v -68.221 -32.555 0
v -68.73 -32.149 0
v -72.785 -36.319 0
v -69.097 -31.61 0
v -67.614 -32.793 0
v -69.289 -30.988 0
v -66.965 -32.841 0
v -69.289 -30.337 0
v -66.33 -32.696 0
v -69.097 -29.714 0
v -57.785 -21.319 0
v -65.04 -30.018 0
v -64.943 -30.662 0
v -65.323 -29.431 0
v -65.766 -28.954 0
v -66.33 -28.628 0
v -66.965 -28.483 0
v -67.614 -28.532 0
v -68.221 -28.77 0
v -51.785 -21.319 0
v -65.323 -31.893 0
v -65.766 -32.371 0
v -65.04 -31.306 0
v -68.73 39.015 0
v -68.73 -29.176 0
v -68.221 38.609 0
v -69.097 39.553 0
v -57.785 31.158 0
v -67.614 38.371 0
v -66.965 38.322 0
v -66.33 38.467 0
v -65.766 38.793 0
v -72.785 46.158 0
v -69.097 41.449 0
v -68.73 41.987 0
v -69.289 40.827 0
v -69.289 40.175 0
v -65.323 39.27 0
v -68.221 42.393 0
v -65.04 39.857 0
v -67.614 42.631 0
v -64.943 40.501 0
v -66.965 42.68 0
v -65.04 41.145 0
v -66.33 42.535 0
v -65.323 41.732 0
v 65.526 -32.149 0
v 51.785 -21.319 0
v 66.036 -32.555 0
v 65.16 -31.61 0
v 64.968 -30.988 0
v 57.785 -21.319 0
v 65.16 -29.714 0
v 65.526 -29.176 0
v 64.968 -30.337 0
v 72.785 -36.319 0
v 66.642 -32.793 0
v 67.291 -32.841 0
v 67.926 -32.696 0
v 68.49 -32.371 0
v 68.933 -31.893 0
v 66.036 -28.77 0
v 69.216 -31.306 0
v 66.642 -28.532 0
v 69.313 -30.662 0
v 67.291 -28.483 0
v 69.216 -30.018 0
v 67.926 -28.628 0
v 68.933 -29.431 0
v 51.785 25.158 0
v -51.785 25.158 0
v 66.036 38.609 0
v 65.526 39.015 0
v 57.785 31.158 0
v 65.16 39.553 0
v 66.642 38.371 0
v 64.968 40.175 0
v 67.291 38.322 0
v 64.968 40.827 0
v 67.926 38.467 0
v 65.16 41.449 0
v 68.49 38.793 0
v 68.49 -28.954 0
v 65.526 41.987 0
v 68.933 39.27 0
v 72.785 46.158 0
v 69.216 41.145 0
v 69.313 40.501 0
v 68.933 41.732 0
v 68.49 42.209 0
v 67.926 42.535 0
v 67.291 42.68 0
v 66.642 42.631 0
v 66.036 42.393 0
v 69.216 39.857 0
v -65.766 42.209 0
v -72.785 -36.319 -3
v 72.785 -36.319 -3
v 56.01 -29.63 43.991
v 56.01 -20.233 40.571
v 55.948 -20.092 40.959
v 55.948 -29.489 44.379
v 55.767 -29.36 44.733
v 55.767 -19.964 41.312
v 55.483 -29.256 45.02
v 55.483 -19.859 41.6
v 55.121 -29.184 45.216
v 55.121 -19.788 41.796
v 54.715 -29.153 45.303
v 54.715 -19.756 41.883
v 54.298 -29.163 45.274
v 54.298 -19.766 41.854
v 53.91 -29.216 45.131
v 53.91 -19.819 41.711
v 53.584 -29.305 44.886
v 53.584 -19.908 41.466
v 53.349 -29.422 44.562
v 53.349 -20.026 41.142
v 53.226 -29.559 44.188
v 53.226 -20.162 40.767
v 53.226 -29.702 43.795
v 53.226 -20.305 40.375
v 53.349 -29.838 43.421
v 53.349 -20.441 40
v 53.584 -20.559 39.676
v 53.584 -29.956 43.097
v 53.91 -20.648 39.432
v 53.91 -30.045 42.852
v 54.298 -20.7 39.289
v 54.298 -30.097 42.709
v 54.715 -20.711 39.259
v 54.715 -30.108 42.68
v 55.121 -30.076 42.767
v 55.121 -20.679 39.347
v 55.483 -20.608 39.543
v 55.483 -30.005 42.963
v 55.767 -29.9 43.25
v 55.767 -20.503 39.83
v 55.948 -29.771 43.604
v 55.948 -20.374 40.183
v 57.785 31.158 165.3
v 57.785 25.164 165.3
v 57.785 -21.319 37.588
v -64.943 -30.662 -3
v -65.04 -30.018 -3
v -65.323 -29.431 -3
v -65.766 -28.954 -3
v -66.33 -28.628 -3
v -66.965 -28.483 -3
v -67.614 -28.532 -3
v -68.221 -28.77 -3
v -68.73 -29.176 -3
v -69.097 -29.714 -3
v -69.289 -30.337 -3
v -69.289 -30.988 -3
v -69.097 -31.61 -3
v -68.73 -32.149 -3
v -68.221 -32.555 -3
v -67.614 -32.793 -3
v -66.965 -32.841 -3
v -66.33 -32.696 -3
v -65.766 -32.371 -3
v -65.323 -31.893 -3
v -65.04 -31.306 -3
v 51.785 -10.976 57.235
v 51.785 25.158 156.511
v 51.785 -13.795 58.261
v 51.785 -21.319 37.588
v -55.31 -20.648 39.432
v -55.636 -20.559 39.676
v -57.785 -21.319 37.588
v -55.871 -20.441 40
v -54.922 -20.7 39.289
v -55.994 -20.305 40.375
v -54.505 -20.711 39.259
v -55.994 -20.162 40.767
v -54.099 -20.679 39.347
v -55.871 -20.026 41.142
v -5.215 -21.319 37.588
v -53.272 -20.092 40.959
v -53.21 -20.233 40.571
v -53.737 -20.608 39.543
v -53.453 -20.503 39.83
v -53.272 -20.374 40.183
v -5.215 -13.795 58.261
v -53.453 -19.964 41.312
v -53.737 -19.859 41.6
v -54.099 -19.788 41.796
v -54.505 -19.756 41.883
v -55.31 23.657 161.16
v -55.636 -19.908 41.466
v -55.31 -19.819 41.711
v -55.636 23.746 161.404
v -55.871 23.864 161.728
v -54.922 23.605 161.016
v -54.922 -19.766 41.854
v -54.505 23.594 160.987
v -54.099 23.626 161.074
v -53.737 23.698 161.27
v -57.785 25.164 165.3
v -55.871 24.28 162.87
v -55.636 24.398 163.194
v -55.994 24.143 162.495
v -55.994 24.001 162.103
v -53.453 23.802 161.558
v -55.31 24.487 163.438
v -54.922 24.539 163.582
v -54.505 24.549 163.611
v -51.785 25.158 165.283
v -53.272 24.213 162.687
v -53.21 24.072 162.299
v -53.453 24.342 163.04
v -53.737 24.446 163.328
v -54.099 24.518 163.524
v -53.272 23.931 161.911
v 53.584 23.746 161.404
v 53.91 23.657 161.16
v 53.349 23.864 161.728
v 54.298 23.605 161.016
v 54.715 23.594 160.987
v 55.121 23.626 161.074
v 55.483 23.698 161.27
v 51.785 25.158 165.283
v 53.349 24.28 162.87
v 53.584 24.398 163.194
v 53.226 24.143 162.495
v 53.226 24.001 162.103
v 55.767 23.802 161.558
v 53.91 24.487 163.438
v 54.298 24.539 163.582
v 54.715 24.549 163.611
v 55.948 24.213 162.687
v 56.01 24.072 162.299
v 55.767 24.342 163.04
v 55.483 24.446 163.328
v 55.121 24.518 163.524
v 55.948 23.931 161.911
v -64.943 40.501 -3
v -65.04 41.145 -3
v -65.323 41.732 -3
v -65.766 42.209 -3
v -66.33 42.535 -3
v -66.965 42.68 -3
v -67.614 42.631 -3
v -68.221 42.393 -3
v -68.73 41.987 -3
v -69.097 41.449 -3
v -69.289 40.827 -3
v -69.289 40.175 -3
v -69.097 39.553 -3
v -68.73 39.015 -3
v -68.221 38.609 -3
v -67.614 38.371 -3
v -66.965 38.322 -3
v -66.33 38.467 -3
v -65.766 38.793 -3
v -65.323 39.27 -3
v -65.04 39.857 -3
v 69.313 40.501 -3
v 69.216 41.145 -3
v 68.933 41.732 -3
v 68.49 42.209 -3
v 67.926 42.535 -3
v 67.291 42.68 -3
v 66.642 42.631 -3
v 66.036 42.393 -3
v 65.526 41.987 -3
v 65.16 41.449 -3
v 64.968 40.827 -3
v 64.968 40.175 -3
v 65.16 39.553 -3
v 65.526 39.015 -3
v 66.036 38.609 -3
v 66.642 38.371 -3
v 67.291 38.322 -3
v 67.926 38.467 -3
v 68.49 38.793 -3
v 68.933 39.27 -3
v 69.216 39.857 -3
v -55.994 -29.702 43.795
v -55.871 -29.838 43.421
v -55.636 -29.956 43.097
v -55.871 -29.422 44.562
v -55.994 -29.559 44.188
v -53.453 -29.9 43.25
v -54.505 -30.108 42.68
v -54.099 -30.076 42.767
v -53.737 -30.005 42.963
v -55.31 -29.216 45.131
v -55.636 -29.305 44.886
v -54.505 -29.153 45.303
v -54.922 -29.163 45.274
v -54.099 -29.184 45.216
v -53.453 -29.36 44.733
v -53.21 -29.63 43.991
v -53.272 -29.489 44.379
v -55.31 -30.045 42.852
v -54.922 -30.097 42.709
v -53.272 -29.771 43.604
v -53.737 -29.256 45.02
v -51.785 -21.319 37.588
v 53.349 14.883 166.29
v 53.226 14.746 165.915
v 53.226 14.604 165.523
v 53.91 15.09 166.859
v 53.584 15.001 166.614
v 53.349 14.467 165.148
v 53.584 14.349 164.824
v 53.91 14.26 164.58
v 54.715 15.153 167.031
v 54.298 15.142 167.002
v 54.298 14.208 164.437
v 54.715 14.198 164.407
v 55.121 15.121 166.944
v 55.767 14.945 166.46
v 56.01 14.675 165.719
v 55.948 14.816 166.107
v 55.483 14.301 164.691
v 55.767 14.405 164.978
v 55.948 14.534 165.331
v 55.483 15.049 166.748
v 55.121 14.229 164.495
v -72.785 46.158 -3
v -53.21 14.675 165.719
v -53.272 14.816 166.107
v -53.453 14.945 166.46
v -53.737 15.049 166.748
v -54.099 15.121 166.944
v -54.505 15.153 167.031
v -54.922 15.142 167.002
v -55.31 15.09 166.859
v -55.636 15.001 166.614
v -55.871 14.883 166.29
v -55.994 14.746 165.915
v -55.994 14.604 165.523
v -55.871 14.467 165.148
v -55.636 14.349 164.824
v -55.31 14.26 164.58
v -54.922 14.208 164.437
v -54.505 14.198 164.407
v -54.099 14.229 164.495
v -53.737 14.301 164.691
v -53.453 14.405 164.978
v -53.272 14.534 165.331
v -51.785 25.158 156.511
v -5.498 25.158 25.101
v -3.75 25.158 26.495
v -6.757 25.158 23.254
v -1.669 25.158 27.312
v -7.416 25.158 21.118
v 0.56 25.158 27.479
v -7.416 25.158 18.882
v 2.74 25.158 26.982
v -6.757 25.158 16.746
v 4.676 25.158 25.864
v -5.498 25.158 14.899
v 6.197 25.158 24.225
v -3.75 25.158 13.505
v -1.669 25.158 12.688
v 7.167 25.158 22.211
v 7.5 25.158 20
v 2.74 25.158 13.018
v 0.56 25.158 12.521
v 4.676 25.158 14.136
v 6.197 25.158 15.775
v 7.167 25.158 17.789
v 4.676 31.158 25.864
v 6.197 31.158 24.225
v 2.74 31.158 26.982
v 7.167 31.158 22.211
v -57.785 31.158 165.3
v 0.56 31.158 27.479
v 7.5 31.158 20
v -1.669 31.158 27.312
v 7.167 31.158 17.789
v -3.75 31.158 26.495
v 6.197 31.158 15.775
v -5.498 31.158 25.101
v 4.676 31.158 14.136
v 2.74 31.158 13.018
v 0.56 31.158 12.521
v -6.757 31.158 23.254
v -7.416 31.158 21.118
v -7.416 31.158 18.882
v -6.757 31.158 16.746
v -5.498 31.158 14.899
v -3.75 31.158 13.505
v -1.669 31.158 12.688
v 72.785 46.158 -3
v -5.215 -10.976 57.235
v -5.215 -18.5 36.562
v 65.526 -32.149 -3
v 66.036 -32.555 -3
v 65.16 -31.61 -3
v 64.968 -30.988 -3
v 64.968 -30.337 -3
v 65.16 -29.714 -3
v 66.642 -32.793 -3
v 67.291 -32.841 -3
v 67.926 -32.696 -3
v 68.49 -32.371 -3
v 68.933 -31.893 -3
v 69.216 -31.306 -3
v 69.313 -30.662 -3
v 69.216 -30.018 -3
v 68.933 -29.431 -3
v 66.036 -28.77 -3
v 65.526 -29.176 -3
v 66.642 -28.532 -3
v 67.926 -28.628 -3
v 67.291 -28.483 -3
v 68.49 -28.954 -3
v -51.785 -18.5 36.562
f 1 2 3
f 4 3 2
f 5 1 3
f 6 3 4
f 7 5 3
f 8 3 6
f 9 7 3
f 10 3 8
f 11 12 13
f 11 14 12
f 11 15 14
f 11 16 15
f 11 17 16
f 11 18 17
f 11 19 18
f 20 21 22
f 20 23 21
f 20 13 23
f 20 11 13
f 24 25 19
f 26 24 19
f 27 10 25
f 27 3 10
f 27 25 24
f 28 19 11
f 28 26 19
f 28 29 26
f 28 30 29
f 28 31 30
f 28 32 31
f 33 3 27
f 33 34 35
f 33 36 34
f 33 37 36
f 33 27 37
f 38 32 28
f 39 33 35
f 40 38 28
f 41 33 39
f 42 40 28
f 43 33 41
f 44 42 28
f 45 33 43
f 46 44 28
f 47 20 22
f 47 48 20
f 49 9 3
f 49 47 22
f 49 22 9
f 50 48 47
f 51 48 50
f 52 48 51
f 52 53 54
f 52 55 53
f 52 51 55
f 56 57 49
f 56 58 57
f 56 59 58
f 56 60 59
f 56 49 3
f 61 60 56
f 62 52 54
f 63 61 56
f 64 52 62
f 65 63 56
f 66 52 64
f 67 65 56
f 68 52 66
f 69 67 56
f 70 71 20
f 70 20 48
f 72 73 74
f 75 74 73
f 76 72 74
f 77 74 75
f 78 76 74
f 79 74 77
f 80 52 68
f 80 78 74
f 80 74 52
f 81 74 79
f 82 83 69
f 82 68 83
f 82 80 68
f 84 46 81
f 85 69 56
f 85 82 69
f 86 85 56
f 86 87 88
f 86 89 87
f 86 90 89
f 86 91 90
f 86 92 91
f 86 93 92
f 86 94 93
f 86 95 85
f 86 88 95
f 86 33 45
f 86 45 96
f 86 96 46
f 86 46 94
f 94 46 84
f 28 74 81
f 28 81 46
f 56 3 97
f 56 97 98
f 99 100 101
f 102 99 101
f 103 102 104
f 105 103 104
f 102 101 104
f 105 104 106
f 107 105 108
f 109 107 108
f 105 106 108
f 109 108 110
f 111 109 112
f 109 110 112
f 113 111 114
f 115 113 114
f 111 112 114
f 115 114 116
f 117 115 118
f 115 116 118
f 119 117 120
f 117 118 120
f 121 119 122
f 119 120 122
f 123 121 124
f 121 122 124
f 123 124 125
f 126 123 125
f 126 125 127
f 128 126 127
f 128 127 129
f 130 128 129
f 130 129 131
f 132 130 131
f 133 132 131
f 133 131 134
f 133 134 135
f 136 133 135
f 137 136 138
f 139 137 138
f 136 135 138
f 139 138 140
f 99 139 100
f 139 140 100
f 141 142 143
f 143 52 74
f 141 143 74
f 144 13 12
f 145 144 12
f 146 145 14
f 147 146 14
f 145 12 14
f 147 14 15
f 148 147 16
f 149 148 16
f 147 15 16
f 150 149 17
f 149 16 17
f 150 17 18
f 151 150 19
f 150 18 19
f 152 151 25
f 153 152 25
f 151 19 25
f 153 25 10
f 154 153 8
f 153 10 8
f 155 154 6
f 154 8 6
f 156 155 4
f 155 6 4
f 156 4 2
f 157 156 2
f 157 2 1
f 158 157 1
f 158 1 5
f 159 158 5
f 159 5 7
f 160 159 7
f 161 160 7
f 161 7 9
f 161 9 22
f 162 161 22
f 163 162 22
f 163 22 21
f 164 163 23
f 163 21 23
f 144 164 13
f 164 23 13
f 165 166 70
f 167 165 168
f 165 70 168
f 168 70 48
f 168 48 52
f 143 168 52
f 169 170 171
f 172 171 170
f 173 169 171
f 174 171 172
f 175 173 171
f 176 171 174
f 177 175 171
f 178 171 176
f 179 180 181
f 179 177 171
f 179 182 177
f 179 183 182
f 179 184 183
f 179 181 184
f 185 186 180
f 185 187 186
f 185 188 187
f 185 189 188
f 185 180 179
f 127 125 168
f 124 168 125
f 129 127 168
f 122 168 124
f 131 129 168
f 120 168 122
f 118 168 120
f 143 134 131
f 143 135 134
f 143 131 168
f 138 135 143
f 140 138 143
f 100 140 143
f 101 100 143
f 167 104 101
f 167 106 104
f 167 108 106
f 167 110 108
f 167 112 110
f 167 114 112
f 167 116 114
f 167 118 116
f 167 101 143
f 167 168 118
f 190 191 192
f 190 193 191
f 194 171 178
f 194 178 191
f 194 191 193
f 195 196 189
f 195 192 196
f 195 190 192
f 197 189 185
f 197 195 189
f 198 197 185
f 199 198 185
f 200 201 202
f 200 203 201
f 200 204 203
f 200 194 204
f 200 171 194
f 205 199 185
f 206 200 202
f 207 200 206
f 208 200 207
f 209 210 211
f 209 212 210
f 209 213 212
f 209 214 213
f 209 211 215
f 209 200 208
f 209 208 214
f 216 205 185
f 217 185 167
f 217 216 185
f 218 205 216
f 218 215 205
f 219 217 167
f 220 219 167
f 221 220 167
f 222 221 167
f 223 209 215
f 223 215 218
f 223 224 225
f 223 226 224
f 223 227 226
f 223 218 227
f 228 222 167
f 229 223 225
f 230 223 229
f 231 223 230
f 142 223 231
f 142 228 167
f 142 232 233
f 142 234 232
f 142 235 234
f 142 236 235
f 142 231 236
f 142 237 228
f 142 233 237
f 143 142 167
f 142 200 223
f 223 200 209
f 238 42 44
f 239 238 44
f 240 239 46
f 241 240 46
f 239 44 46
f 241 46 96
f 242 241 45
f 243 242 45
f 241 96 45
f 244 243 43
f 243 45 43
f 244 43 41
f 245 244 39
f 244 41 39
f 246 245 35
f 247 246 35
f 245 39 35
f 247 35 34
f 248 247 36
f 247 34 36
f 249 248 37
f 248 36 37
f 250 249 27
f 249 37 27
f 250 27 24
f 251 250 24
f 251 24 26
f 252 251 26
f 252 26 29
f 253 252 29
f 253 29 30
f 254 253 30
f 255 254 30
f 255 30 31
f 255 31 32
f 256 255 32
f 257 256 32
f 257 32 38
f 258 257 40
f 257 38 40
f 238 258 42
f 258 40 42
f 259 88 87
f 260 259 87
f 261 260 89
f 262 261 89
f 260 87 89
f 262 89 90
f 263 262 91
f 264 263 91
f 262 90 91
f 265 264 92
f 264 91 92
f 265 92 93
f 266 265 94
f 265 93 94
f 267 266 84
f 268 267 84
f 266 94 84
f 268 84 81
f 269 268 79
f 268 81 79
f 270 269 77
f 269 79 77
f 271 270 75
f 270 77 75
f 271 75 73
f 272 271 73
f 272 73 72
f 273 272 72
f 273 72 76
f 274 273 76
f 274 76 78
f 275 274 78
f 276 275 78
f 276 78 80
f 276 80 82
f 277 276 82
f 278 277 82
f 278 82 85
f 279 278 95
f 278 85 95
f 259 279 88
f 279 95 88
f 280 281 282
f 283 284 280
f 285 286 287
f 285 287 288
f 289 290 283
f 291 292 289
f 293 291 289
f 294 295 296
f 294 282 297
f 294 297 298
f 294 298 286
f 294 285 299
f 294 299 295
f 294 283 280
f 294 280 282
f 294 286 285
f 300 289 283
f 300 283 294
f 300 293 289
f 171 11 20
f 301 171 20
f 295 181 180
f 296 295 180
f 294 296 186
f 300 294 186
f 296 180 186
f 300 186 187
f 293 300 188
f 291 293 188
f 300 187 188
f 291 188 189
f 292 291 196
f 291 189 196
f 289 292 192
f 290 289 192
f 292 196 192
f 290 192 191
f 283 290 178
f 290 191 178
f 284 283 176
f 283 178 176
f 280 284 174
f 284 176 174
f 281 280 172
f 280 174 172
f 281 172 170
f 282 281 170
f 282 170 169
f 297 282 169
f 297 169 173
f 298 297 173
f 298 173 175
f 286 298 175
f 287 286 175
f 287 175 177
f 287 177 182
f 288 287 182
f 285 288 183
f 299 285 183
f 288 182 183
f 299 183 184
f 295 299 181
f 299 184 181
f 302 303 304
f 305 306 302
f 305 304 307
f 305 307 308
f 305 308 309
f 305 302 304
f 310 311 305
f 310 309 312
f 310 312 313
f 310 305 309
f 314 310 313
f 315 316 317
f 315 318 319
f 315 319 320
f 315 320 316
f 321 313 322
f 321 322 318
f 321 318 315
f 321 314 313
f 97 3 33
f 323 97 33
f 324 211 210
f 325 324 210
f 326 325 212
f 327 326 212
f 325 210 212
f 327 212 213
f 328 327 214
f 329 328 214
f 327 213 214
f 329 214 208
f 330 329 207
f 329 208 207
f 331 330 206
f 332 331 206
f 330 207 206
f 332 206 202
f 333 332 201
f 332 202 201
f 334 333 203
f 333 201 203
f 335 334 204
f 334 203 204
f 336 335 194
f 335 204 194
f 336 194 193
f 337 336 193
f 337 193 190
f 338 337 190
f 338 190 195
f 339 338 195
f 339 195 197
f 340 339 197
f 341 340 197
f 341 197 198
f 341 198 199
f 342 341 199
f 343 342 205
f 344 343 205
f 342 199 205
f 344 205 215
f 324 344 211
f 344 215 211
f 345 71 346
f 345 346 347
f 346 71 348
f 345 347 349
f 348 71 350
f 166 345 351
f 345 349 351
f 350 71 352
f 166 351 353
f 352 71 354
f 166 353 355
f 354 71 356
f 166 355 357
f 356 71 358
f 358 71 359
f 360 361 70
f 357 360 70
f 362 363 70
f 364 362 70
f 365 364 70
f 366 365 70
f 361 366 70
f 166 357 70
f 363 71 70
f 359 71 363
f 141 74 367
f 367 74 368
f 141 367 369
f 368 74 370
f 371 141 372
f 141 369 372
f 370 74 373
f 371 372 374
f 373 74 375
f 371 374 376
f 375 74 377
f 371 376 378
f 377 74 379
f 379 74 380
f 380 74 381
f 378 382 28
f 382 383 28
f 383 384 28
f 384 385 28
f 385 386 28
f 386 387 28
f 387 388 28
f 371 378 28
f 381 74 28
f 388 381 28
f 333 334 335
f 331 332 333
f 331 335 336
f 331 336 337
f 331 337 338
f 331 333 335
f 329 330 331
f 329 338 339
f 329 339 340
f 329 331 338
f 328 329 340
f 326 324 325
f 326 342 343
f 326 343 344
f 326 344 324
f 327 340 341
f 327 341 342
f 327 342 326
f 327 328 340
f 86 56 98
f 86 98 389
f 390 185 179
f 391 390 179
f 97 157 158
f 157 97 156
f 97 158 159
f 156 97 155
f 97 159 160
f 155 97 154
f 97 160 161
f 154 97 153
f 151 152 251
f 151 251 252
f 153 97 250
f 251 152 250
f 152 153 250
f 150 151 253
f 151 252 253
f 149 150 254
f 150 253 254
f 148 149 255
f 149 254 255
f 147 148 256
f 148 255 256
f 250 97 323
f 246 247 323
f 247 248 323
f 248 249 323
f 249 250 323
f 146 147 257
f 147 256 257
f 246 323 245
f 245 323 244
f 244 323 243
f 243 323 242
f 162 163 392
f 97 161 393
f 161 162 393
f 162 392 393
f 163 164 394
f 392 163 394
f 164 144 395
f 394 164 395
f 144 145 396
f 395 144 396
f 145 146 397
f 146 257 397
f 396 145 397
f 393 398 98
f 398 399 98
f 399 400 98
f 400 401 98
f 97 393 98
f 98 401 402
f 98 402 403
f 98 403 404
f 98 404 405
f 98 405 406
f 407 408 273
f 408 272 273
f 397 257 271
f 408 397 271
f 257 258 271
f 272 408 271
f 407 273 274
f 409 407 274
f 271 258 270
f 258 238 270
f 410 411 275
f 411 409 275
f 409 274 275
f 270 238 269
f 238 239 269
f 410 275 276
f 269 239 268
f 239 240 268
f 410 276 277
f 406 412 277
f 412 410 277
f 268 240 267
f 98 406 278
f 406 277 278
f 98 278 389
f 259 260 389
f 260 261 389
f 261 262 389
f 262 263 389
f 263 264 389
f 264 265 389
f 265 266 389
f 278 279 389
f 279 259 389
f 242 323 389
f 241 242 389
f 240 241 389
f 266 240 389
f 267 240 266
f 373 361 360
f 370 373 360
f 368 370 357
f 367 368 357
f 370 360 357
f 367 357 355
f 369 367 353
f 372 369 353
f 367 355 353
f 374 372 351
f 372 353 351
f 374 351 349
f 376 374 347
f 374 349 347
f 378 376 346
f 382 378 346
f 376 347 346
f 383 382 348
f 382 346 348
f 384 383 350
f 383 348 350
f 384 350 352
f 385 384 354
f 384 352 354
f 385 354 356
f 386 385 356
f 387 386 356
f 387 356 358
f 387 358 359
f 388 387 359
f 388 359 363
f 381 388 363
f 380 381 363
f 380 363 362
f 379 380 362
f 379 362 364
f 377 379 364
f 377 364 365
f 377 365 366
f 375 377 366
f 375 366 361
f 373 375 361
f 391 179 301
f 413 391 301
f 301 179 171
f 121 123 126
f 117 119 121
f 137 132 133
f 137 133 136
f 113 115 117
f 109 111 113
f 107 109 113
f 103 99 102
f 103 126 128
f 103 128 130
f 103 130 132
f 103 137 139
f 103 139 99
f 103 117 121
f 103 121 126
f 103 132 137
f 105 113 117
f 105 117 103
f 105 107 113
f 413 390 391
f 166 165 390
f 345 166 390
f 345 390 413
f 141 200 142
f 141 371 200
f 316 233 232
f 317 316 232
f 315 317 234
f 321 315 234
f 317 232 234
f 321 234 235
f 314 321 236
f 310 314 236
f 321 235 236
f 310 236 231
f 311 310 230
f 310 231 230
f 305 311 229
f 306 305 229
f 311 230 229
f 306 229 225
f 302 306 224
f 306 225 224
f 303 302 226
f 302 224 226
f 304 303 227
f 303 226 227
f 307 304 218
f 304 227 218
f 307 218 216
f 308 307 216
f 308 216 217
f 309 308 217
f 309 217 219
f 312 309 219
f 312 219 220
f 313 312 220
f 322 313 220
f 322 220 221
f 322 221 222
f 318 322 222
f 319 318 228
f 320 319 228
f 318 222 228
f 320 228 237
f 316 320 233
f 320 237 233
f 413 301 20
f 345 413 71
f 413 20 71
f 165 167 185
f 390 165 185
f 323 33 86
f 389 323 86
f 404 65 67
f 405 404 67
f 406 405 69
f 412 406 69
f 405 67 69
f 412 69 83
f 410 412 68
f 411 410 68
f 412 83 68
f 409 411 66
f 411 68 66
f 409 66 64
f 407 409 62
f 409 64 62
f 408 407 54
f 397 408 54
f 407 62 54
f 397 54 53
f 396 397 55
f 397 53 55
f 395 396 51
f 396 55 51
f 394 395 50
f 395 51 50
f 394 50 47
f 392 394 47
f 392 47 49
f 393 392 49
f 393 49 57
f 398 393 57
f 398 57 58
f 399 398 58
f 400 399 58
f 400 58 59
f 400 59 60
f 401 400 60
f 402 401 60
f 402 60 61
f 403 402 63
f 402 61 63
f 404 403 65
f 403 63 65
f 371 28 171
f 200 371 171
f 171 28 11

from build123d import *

# Parameters (mm, degrees)
SKETCH001_W     = 145.57
SKETCH001_H     = 82.477117
SKETCH001_R     = 2.185
PAD_DEPTH       = 3
PAD001_DEPTH    = 165.3
SKETCH004_W     = 328.820023
SKETCH004_H     = 275.658927
POCKET_DEPTH    = 200
PAD002_DEPTH    = 3
SKETCH003_R     = 1.4
PAD003_DEPTH    = 10
SKETCH005_R     = 7.5
POCKET001_DEPTH = 46.158923


with BuildPart() as part:
    # Sketch001 → Pad (new body)
    with BuildSketch(Plane.XY):
        with Locations((0, 4.919365)):
            Rectangle(SKETCH001_W, SKETCH001_H)
        with Locations((-67.128146, 40.501069)):
            Circle(SKETCH001_R, mode=Mode.SUBTRACT)
        with Locations((67.128146, 40.501069)):
            Circle(SKETCH001_R, mode=Mode.SUBTRACT)
        with Locations((67.128146, -30.66234)):
            Circle(SKETCH001_R, mode=Mode.SUBTRACT)
        with Locations((-67.128146, -30.66234)):
            Circle(SKETCH001_R, mode=Mode.SUBTRACT)
    extrude(amount=-PAD_DEPTH)

    # Sketch → Pad001 (join)
    with BuildSketch(Plane.XY):
        Polygon((51.785, -21.319194), (57.785, -21.319194), (57.785, 31.157923), (-57.785, 31.157923), (-57.785, -21.319194), (-51.785, -21.319194), (-51.785, 25.157923), (51.785, 25.157923), align=None)
    extrude(amount=PAD001_DEPTH)

    # Sketch004 (on DatumPlane) → Pocket (cut)
    with BuildSketch(Plane(origin=(0, -35, 0), x_dir=(1, 0, 0), z_dir=(0, -0.939693, 0.34202))):
        with Locations((-2.626228, 137.829464)):
            Rectangle(SKETCH004_W, SKETCH004_H)
    extrude(amount=POCKET_DEPTH, mode=Mode.SUBTRACT)

    # Sketch002 (on DatumPlane) → Pad002 (join)
    with BuildSketch(Plane(origin=(0, -35, 0), x_dir=(1, 0, 0), z_dir=(0, -0.939693, 0.34202))):
        Polygon((-57.785, 175.89), (57.785, 175.89), (57.785, 40), (51.785, 40), (51.785, 62), (-5.215, 62), (-5.215, 40), (-57.785, 40), align=None)
    extrude(amount=-PAD002_DEPTH)

    # Sketch003 (on DatumPlane) → Pad003 (join)
    with BuildSketch(Plane(origin=(0, -35, 0), x_dir=(1, 0, 0), z_dir=(0, -0.939693, 0.34202))):
        with Locations((-54.61, 172.715)):
            Circle(SKETCH003_R)
        with Locations((54.61, 172.715)):
            Circle(SKETCH003_R)
        with Locations((54.61, 43.175)):
            Circle(SKETCH003_R)
        with Locations((-54.61, 43.175)):
            Circle(SKETCH003_R)
    extrude(amount=PAD003_DEPTH)

    # Sketch005 → Pocket001 (cut, through all)
    with BuildSketch(Plane.XZ):
        with Locations((0, 20)):
            Circle(SKETCH005_R)
    extrude(amount=-POCKET001_DEPTH, mode=Mode.SUBTRACT)


solid = part.part
